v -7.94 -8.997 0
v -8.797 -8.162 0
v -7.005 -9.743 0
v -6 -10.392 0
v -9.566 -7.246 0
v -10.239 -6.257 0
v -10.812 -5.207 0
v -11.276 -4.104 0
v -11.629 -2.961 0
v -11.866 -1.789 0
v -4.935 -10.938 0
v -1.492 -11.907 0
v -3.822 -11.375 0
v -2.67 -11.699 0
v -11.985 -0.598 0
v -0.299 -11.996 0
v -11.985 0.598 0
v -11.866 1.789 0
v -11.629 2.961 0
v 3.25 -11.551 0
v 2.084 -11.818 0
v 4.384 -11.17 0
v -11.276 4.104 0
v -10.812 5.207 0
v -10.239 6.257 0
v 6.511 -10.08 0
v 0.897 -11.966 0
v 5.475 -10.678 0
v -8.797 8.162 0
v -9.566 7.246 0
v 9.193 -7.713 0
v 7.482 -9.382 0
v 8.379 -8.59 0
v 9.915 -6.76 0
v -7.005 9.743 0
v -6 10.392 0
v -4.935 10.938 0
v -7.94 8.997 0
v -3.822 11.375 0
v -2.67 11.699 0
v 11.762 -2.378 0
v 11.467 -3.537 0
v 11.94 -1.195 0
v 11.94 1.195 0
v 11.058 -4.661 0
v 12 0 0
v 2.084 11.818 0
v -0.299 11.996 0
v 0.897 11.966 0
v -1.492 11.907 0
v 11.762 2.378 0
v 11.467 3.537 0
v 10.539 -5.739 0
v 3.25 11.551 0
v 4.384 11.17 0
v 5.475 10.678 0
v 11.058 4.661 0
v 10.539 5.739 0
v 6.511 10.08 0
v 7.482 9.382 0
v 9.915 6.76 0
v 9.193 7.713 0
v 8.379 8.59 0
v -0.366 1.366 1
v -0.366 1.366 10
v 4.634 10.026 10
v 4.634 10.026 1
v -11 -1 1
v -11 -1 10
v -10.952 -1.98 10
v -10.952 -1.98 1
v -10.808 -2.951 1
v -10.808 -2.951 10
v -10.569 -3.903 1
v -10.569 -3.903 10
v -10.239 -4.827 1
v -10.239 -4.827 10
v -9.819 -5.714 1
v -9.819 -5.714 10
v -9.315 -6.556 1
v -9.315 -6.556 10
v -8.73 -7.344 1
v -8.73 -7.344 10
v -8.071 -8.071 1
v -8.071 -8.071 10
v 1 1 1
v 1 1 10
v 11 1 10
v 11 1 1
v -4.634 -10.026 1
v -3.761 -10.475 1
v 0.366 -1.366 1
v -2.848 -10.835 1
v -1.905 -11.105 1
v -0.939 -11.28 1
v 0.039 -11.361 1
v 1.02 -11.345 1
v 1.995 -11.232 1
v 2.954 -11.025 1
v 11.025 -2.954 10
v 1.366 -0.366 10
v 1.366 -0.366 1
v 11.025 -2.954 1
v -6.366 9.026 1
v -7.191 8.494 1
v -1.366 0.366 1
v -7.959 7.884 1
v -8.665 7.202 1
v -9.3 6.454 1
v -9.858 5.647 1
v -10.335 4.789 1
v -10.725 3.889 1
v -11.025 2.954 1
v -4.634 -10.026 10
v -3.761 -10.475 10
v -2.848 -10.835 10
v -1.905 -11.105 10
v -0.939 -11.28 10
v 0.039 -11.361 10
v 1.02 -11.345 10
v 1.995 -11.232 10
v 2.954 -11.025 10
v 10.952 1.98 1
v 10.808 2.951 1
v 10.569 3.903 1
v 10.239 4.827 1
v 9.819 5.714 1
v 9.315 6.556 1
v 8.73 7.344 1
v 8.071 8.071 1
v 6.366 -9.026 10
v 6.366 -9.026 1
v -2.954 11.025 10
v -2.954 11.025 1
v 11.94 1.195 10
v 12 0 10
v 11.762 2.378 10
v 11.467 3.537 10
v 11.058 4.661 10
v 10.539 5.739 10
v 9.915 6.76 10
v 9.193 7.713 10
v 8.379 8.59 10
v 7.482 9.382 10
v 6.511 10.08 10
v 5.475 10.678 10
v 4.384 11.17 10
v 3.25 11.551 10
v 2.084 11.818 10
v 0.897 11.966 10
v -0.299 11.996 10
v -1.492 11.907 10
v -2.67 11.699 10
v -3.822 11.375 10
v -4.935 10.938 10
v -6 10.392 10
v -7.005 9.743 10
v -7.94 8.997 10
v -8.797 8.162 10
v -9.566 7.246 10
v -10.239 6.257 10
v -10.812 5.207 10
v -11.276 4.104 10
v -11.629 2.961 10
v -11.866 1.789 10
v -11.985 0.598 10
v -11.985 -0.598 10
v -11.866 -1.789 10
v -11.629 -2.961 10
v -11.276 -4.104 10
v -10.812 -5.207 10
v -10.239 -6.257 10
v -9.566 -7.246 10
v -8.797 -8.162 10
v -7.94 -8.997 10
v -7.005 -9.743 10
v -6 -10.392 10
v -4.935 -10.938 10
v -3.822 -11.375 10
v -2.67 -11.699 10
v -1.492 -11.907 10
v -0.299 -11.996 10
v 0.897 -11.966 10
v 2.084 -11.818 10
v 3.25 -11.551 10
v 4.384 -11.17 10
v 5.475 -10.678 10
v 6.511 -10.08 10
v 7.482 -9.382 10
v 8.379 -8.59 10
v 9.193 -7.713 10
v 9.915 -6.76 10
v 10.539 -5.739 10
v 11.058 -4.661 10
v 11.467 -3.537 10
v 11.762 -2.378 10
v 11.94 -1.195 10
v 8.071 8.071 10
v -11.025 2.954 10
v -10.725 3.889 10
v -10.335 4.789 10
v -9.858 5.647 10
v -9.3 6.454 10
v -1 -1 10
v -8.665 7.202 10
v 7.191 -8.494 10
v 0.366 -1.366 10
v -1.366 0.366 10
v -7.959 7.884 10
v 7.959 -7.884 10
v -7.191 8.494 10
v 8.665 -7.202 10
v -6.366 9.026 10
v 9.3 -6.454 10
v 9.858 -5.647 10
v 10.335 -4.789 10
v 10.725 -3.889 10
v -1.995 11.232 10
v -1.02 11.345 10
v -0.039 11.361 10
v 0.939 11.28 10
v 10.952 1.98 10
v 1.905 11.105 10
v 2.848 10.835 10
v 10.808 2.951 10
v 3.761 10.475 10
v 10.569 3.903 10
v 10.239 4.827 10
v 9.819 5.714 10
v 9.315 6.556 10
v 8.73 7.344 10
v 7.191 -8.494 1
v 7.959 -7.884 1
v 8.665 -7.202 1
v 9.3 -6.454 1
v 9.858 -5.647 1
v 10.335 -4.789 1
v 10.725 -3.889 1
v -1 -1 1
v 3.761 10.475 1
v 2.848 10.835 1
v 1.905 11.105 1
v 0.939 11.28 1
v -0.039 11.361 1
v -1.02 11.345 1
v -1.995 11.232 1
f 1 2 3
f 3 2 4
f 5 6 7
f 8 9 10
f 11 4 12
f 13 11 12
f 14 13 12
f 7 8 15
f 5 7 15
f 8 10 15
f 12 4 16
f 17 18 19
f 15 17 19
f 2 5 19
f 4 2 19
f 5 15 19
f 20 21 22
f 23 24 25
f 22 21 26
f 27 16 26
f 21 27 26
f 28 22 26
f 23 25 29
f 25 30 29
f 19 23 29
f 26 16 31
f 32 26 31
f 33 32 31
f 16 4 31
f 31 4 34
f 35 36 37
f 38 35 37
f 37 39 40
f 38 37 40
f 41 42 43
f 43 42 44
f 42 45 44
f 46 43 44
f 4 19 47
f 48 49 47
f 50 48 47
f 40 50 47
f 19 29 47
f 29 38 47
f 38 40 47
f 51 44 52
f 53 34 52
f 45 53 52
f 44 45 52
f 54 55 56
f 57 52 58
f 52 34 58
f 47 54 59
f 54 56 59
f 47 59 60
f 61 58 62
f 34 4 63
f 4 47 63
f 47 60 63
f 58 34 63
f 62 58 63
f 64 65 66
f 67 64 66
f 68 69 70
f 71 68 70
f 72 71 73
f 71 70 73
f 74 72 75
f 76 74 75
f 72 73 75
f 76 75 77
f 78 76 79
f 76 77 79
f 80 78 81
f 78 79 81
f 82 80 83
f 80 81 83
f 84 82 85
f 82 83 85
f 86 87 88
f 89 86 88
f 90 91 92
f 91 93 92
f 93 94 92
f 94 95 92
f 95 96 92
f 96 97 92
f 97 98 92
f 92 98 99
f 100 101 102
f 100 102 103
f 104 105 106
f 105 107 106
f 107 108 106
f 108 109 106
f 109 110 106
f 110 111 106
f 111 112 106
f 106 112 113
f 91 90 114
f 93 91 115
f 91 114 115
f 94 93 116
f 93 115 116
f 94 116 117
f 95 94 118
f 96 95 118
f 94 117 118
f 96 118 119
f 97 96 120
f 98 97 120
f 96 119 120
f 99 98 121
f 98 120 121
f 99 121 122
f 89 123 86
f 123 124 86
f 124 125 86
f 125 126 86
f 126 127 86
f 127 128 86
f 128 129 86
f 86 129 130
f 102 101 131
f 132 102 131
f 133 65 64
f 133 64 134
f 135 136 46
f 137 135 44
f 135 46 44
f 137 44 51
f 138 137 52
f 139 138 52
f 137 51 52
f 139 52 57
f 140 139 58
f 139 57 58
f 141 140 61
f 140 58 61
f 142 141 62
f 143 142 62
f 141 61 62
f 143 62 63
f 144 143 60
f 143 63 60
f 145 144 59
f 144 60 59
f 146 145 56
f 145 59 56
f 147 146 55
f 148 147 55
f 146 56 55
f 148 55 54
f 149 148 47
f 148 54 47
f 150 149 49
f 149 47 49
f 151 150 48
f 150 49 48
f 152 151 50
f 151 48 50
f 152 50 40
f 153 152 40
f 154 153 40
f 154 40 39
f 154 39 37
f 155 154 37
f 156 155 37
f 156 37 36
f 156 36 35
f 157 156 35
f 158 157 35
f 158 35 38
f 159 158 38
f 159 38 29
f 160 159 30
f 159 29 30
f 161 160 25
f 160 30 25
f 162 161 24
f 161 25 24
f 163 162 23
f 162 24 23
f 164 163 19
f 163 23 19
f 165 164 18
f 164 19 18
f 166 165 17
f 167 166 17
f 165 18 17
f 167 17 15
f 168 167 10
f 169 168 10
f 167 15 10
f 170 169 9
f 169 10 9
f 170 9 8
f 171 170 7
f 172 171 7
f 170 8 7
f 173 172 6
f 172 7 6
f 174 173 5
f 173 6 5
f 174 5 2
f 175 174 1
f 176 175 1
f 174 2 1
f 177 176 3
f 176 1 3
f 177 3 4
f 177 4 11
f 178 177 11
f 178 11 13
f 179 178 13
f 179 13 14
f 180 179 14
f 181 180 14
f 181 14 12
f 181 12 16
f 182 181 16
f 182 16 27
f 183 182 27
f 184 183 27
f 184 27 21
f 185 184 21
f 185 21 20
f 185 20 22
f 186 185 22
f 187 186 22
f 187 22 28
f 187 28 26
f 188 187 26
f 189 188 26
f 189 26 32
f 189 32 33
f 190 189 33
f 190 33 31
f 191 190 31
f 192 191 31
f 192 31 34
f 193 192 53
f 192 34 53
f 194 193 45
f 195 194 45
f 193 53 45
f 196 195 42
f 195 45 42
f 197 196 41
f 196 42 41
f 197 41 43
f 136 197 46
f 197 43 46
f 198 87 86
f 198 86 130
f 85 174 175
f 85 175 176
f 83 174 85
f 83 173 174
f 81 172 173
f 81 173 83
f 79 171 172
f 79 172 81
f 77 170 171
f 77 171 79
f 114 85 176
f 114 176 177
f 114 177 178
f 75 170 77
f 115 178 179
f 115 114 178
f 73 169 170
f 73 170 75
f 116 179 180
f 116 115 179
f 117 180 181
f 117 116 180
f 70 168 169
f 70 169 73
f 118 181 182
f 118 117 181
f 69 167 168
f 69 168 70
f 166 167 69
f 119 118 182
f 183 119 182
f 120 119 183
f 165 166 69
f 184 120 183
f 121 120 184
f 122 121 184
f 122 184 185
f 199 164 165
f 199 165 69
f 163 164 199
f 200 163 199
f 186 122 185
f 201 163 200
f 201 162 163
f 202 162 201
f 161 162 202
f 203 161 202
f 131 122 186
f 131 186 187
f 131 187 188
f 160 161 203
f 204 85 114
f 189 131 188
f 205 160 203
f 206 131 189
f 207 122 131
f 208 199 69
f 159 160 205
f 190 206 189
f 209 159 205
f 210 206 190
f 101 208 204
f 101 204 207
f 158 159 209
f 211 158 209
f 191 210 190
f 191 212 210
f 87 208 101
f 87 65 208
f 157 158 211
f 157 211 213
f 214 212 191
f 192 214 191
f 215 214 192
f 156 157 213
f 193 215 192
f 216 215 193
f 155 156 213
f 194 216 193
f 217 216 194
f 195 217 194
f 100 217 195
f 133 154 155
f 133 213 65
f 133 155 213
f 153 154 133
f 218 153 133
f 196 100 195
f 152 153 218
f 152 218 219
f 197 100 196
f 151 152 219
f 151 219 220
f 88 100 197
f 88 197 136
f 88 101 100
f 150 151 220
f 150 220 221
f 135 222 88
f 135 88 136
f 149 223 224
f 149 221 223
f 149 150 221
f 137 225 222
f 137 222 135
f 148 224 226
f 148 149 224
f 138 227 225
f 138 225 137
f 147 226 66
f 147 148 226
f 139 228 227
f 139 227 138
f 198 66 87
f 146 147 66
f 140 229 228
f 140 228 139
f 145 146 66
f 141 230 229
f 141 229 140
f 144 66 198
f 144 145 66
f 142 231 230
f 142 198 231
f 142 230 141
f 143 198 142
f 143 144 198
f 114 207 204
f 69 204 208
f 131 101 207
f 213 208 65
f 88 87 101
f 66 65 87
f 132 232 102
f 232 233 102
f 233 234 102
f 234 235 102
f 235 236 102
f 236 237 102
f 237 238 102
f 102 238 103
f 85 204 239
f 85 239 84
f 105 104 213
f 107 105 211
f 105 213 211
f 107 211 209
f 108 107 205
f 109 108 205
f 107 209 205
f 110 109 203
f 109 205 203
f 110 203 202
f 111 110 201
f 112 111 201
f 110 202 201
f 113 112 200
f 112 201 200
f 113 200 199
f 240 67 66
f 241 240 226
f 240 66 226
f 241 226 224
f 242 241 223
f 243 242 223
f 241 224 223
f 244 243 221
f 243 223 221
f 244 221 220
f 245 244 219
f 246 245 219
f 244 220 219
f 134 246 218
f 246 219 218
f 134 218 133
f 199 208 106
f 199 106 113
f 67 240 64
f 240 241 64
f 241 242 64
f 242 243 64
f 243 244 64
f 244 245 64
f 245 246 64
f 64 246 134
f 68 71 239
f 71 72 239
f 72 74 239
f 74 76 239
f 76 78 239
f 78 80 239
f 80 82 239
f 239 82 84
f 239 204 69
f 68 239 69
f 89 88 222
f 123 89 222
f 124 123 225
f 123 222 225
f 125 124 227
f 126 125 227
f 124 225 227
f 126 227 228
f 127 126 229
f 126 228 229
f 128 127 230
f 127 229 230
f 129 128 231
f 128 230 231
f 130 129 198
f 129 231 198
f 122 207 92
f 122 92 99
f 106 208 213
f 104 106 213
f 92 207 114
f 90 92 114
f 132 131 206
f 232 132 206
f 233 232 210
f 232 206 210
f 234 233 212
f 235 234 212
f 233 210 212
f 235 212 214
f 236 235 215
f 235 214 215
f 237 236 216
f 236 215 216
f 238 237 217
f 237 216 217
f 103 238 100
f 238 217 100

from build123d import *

# Parameters (mm, degrees)
CYLINDER001_W     = 10
CYLINDER001_H     = 10
CYLINDER001_ANGLE = 45
ARRAY_COUNT       = 6
CYLINDER_R        = 12
CYLINDER_DEPTH    = 10


with BuildPart() as array:
    # Cylinder001 → Cylinder001 (revolve)
    with BuildSketch(Plane(origin=(1, 1, 1), x_dir=(1, 0, 0), z_dir=(0, -1, 0))):
        with Locations((5, 5)):
            Rectangle(CYLINDER001_W, CYLINDER001_H)
    revolve(axis=Axis((1, 1, 1), (0, 0, 1)), revolution_arc=CYLINDER001_ANGLE)

    # Array: Array ×6 about axis
    array_axis = Axis((0, 0, 0), (0, 0, 1))


with BuildPart() as array_1:
    add(array.part)
    for i in range(1, ARRAY_COUNT):
        add(array.part.rotate(array_axis, i * 360 / ARRAY_COUNT))


with BuildPart() as cut:
    # Cylinder → Cylinder (new body)
    with BuildSketch(Plane.XY):
        Circle(CYLINDER_R)
    extrude(amount=CYLINDER_DEPTH)

    # Cut: cut Array
    add(array_1.part, mode=Mode.SUBTRACT)


solid = cut.part
